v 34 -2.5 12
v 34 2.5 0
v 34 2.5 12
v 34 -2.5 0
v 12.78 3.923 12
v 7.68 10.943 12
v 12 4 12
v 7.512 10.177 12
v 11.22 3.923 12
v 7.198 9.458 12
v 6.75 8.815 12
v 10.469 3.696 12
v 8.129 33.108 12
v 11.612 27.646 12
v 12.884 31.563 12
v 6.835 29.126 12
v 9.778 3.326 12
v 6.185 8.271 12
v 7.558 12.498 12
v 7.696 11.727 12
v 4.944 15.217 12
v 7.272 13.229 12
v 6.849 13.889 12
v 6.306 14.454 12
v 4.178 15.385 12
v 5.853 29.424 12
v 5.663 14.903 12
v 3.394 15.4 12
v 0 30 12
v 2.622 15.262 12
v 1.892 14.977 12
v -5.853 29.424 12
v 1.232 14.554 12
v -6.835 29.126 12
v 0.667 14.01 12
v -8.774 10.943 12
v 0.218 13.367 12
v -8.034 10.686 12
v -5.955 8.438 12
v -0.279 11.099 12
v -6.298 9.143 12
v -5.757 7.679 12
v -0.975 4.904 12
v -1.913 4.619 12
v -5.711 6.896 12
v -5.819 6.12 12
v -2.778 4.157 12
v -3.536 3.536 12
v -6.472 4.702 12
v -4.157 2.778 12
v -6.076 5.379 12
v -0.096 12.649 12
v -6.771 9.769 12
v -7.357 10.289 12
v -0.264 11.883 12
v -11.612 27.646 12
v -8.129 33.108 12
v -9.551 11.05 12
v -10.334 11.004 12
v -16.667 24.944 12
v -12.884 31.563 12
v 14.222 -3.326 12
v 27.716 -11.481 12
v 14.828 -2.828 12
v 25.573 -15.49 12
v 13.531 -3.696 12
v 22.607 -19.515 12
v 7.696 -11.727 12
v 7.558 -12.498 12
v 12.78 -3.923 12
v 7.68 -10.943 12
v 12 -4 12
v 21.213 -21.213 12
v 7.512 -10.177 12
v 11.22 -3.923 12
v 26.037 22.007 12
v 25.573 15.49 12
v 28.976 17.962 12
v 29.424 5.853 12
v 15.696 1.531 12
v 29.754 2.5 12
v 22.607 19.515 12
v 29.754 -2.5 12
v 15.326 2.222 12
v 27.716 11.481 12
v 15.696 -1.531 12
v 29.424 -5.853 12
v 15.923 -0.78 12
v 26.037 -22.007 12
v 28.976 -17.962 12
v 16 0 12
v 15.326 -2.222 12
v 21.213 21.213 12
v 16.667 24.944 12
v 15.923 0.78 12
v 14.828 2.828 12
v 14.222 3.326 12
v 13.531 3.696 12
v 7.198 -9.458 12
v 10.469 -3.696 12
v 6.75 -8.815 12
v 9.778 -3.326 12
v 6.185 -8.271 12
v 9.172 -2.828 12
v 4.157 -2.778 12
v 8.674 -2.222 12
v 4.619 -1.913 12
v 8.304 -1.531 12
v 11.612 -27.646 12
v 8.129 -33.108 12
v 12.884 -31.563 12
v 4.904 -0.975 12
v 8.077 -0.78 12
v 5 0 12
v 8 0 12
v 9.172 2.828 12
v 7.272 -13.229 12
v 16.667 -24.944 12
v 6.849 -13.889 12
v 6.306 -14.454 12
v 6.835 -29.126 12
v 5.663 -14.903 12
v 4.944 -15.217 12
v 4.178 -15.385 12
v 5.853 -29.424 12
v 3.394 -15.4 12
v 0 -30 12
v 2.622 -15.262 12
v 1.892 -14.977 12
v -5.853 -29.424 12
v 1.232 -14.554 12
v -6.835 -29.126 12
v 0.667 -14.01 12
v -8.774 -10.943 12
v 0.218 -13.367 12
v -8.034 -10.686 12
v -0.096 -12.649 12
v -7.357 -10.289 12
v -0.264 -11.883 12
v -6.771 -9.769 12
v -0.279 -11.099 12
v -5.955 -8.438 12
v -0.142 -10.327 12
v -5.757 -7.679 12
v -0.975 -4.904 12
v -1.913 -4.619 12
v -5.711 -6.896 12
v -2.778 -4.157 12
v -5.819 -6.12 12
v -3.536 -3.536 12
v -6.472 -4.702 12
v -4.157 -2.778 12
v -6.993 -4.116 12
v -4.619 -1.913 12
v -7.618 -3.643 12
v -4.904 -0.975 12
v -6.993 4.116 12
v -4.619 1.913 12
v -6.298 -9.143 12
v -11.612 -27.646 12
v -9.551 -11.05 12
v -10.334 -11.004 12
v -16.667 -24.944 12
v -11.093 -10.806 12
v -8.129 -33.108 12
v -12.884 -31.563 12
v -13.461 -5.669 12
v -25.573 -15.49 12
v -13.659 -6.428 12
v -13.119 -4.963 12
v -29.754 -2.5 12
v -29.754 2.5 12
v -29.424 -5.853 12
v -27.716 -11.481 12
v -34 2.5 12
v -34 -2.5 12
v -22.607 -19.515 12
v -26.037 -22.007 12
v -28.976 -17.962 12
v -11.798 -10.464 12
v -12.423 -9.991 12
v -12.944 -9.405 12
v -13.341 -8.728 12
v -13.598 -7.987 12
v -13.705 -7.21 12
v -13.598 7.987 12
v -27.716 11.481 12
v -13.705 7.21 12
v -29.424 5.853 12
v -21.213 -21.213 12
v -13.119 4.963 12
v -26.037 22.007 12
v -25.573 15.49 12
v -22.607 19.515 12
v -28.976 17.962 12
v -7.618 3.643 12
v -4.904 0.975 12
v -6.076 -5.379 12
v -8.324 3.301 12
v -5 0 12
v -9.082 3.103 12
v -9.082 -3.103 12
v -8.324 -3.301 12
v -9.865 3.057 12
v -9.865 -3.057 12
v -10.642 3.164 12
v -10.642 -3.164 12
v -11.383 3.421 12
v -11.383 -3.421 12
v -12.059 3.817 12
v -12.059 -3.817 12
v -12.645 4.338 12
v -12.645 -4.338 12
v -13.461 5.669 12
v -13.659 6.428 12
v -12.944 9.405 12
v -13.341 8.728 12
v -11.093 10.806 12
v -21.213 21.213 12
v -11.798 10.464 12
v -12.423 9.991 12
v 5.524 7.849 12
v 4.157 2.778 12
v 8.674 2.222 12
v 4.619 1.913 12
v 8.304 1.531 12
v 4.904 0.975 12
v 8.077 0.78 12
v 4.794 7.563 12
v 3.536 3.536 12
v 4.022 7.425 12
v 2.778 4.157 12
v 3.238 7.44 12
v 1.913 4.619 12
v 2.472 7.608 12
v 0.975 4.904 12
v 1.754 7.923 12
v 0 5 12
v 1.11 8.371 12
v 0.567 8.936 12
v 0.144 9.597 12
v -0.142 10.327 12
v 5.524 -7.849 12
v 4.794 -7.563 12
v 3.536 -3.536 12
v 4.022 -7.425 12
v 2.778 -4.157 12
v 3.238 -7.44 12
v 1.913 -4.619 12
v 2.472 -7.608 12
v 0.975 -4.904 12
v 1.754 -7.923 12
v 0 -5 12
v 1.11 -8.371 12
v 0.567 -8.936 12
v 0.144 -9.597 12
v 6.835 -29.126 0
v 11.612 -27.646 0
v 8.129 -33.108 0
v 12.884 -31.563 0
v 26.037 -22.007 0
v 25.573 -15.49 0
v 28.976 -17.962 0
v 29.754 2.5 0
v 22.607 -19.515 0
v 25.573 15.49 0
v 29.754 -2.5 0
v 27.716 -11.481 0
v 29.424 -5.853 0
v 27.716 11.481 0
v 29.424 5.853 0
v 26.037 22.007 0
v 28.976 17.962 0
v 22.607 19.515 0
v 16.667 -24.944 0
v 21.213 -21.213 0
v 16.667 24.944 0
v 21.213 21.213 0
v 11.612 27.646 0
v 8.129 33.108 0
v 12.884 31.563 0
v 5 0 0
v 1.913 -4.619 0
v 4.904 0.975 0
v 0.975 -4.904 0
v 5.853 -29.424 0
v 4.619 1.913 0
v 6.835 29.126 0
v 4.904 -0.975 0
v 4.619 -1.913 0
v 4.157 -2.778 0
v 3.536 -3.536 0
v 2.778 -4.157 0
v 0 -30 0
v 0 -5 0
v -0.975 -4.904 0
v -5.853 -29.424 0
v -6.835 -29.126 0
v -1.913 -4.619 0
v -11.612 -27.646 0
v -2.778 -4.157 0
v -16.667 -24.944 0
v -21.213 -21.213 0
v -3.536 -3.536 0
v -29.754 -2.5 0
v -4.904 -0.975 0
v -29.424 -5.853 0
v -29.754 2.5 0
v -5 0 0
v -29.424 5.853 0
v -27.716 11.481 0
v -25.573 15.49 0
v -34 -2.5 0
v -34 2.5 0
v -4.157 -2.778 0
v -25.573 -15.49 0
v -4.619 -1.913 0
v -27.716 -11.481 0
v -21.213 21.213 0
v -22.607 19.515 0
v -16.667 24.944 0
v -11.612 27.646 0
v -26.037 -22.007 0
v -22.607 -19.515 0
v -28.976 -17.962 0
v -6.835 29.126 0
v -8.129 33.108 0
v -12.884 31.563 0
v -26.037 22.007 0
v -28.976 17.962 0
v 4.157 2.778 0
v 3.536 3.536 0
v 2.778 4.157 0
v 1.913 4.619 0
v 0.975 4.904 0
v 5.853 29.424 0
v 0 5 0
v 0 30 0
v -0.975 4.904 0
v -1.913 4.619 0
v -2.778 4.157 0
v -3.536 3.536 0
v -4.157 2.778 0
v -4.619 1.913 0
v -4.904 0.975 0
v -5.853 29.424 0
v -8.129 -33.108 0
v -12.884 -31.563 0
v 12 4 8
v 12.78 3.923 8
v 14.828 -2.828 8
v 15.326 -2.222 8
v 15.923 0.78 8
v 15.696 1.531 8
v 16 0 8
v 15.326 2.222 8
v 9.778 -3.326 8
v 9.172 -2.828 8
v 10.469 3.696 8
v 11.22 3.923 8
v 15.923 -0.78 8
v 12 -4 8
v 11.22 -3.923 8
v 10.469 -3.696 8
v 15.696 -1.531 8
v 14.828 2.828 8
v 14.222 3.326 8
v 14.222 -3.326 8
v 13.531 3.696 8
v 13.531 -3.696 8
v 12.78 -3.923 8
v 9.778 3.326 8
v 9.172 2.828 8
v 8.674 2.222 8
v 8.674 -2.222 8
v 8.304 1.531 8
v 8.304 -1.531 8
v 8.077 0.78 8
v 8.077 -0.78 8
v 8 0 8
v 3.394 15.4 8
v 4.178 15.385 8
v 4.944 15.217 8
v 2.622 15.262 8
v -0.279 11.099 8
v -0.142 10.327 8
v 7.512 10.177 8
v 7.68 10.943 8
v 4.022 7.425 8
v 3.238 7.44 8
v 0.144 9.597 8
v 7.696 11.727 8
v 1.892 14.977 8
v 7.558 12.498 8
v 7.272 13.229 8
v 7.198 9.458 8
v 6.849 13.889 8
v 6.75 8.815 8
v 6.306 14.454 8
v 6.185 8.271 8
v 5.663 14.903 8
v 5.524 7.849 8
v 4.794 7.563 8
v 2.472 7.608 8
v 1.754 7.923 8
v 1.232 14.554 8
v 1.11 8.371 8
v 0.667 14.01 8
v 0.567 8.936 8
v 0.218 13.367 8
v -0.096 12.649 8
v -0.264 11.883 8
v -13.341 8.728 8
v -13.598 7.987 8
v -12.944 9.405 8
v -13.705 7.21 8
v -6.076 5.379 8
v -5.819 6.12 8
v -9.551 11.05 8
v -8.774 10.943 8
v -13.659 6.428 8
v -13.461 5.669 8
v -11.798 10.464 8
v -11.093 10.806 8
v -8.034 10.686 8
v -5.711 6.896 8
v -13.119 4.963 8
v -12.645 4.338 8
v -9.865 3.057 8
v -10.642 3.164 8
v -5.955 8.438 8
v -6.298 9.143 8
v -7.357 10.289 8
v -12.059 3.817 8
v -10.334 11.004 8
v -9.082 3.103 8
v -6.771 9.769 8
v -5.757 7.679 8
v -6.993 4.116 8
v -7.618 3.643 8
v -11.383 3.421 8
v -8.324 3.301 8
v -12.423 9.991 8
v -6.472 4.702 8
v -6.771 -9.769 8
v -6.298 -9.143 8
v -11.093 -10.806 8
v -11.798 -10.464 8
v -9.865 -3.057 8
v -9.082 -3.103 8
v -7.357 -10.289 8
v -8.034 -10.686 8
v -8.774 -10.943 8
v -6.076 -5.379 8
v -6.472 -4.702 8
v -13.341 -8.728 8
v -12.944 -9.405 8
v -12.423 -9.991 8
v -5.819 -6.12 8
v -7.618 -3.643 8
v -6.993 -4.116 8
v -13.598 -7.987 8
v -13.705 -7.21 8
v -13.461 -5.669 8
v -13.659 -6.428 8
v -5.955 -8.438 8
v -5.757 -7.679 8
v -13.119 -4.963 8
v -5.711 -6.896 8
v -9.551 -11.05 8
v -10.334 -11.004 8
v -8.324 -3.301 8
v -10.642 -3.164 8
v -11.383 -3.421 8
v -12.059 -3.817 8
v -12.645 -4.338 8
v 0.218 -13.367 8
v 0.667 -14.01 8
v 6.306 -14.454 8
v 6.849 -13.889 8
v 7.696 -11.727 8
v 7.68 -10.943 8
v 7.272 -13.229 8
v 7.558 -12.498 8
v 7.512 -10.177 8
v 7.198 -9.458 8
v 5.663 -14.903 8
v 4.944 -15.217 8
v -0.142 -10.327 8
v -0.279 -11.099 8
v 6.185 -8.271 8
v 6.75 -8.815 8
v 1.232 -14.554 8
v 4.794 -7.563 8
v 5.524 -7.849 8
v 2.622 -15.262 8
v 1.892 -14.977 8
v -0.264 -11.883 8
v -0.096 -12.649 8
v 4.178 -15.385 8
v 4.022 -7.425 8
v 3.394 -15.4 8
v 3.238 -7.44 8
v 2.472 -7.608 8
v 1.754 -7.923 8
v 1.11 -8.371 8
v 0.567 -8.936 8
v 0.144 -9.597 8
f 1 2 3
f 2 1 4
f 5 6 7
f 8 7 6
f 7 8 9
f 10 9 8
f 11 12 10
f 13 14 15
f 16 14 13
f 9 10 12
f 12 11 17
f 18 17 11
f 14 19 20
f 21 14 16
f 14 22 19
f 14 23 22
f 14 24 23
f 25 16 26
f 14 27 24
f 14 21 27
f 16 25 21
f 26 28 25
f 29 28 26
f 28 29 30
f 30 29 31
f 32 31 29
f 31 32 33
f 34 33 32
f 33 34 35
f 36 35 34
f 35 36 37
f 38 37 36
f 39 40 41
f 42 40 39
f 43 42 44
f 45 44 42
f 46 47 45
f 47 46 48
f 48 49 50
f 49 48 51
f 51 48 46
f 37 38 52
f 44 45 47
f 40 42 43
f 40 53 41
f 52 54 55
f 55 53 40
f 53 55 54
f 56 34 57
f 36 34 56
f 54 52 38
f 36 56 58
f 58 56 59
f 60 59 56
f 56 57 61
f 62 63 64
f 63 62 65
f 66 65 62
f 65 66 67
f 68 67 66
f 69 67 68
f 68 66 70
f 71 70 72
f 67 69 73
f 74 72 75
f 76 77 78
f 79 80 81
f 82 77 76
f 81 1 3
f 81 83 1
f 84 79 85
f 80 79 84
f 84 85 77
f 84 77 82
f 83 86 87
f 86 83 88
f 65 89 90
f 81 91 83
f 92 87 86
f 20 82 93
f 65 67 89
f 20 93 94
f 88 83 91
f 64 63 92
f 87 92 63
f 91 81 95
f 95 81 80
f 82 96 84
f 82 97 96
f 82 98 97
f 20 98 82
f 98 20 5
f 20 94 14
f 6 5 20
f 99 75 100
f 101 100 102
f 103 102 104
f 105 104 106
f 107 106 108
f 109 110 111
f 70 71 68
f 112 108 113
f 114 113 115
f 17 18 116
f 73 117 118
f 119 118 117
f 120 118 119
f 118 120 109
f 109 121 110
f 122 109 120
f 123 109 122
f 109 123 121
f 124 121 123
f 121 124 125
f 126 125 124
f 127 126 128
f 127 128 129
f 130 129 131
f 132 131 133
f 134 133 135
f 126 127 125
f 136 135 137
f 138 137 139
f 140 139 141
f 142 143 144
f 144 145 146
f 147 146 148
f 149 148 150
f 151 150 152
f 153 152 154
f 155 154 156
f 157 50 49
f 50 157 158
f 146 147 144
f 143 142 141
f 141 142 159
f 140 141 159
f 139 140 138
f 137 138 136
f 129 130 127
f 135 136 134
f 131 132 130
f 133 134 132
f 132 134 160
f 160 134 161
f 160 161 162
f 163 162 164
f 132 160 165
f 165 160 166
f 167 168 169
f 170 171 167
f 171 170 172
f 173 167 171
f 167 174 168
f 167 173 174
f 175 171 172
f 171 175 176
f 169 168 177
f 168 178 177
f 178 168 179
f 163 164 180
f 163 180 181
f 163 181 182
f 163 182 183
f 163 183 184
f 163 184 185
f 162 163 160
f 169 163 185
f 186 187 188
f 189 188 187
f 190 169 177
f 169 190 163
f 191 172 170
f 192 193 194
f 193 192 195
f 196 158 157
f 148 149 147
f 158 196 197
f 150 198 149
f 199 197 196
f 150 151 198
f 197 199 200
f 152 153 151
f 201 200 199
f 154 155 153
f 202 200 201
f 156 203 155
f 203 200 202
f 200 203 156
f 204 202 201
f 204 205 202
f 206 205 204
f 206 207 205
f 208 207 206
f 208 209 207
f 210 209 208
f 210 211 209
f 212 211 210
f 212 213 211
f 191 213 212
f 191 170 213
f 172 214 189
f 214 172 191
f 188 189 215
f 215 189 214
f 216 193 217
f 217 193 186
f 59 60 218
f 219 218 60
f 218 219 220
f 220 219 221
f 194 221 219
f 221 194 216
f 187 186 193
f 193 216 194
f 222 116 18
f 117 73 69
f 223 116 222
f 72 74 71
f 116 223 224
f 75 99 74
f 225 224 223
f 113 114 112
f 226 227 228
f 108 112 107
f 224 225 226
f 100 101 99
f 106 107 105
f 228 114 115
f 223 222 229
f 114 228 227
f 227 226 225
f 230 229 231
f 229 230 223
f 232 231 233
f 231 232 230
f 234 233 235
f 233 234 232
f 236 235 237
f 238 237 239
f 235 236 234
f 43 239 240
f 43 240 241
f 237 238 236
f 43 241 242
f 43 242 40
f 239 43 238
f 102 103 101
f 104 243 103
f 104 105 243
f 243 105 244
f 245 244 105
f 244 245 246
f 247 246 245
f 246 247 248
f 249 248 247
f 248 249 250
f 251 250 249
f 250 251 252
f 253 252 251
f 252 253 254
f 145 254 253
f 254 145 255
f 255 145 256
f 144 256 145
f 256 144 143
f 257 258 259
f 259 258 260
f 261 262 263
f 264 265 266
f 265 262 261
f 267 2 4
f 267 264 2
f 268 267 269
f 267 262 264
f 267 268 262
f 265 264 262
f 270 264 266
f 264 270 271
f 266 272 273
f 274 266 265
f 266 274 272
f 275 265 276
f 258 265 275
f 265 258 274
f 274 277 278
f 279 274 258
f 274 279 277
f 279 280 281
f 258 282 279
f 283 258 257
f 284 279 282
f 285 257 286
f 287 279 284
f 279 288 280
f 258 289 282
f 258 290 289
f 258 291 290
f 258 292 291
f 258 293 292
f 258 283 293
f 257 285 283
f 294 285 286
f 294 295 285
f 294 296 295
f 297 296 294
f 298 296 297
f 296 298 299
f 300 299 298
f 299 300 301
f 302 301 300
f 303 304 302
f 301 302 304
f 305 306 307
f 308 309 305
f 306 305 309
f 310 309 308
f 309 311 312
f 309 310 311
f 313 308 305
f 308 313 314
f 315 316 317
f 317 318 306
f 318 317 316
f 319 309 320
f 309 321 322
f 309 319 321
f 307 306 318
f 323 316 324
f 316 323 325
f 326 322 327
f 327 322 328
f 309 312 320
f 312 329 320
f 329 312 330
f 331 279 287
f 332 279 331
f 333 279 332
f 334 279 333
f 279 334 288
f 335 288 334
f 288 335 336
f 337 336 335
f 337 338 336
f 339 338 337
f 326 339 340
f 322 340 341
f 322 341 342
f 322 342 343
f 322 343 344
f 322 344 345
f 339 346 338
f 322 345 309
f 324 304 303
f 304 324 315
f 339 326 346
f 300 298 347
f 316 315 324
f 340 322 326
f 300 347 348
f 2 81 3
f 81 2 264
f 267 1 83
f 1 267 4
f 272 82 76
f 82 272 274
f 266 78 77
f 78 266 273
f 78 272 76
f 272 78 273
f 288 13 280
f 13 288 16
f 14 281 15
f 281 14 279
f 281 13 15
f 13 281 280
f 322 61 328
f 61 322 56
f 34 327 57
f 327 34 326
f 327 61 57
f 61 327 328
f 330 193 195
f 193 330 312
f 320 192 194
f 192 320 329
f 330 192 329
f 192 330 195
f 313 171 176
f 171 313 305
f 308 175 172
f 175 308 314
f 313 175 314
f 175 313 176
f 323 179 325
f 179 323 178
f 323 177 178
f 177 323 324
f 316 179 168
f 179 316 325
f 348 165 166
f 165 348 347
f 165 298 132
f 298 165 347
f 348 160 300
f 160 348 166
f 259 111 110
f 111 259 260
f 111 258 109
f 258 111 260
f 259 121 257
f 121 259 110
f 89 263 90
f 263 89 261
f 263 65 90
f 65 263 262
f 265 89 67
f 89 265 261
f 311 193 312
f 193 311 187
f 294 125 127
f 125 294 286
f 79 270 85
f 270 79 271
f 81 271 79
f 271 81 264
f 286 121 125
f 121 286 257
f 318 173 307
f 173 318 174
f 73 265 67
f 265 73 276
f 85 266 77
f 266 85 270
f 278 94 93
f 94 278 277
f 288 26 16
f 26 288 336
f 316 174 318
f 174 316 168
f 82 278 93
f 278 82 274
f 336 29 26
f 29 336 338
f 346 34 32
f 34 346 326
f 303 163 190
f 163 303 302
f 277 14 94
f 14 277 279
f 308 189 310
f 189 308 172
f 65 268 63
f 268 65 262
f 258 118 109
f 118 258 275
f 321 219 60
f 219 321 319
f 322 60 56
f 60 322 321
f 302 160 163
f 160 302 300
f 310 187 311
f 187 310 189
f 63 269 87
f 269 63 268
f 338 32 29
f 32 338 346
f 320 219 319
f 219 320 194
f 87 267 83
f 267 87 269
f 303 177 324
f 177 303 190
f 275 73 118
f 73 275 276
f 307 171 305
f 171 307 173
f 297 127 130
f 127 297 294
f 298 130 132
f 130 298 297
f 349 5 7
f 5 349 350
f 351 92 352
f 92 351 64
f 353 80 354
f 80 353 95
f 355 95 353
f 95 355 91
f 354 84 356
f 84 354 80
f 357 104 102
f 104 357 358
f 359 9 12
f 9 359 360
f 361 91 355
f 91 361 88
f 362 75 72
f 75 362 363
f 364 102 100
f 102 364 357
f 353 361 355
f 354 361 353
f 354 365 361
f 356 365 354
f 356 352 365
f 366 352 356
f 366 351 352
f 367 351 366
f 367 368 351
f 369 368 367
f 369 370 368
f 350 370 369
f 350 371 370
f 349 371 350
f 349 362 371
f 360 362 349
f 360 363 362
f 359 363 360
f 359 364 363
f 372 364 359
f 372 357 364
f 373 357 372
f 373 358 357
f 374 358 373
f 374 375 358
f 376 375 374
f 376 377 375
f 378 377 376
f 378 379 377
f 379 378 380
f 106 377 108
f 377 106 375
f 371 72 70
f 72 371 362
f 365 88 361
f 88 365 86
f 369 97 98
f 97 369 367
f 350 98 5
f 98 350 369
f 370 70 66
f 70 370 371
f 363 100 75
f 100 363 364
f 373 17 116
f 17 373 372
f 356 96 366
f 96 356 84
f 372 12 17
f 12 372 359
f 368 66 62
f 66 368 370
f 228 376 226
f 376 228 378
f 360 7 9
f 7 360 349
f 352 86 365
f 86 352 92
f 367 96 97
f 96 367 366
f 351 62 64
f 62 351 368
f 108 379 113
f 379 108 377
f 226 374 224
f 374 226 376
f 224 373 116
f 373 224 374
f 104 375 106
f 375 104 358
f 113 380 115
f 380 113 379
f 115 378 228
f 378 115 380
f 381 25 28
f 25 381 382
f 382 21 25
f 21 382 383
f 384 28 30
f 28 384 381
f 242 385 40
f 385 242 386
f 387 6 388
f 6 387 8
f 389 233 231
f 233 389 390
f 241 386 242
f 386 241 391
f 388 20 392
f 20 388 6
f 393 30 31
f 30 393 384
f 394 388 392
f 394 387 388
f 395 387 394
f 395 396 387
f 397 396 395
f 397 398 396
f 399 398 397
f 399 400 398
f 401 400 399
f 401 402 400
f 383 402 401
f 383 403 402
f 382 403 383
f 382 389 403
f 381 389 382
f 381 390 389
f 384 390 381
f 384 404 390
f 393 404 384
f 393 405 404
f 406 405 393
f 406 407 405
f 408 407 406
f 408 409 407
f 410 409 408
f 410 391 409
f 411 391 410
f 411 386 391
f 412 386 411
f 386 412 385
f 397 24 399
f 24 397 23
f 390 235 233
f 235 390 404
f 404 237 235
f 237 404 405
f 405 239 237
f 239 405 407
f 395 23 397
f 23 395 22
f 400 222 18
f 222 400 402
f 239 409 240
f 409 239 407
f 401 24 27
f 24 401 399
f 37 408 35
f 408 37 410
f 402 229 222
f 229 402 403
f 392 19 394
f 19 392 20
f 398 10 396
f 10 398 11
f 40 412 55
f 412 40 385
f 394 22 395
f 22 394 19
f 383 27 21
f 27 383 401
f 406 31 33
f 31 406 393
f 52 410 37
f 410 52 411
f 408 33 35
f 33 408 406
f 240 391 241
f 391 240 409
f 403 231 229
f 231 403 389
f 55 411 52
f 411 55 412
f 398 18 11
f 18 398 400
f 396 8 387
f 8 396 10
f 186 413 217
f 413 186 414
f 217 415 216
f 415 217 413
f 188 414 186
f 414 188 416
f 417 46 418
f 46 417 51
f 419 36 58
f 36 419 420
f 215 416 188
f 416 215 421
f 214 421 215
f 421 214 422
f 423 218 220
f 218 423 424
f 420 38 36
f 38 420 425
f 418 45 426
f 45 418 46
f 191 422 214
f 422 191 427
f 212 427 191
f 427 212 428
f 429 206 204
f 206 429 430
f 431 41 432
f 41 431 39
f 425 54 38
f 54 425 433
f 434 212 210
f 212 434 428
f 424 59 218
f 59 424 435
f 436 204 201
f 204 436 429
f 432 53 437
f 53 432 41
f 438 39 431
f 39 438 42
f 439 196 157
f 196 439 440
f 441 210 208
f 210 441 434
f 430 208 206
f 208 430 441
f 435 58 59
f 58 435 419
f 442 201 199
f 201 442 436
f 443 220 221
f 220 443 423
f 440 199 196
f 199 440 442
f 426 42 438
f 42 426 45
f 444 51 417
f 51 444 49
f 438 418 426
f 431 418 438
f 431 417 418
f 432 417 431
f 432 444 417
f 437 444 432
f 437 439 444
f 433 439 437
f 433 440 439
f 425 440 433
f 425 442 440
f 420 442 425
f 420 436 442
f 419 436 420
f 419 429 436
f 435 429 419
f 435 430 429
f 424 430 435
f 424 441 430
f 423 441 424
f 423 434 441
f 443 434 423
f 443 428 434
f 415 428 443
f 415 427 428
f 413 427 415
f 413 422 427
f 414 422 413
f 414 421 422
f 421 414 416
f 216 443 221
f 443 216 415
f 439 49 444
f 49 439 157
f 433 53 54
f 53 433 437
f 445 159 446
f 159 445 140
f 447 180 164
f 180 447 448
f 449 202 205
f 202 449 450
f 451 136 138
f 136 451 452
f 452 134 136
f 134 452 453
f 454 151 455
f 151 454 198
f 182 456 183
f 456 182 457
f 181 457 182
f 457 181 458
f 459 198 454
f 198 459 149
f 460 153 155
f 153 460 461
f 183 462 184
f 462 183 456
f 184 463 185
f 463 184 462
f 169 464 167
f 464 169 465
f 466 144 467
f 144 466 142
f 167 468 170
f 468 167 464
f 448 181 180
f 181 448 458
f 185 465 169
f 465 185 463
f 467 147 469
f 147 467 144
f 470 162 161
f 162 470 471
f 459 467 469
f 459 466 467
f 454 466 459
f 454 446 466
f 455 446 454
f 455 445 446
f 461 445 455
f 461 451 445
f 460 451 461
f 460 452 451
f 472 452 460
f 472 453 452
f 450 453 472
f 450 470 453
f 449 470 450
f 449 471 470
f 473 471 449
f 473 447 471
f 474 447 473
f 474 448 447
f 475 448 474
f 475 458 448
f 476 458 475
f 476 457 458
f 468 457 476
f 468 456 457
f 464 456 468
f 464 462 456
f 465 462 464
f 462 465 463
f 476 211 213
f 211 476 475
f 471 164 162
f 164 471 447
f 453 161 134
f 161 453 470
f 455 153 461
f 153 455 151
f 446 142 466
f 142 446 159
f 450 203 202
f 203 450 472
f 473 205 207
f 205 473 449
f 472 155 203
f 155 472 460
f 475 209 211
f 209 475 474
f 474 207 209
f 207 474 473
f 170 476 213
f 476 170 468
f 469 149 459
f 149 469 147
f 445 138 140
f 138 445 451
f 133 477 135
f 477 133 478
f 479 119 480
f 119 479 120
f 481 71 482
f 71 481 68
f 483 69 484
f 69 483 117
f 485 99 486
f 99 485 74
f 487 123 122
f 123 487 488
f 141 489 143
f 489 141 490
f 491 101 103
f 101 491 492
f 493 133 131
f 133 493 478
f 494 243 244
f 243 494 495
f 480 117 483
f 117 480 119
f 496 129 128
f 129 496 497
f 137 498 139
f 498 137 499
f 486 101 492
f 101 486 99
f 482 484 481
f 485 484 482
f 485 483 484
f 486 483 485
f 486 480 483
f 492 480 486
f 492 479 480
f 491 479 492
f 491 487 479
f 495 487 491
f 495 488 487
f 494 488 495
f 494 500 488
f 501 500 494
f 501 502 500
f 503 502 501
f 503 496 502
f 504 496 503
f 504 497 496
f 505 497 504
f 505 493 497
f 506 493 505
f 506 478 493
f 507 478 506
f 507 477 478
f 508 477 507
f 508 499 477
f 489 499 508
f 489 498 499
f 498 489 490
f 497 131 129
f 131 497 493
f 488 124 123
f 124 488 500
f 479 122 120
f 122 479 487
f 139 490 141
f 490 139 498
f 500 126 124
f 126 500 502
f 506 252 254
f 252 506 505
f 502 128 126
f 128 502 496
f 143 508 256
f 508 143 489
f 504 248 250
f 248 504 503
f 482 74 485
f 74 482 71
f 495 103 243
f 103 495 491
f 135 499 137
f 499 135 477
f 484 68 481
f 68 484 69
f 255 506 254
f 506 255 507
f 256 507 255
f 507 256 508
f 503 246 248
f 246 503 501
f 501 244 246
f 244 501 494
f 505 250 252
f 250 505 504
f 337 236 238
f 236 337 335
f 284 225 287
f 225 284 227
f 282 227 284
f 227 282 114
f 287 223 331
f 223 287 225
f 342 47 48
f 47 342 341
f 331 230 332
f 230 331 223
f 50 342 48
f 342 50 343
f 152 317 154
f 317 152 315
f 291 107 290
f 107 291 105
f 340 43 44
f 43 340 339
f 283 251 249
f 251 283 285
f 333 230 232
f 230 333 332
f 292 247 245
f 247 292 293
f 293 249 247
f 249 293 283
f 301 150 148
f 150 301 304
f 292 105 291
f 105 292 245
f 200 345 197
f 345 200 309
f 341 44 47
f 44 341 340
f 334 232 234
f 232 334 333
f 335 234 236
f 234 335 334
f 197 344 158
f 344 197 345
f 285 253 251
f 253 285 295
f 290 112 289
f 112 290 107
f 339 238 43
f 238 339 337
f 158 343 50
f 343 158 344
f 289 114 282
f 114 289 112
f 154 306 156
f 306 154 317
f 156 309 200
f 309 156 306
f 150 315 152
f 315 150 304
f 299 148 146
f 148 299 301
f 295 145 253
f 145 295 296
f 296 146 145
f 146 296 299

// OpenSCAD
$fn = 32;

// ----------------------------------------------------------------------
// Spur blank: lightened gear blank
// ----------------------------------------------------------------------

// --- parameters (mm) ---
disc_r = 30;              // blank root radius
disc_t = 12;              // blank thickness
n_teeth = 10;             // stub tooth count
tooth_w = 5;              // tooth width at the root
tooth_h = 4;              // tooth height above the root
bore_r = 5;               // central bore radius
ring_r = 12;              // lightening pocket ring radius
pocket_r = 4;             // lightening pocket radius

out_r = disc_r + tooth_h;  // tip radius
bbox_x = 68.0;  // measured width over the teeth
bbox_y = 66.22;  // measured depth over the teeth

difference() {
union() {
  cylinder(r = disc_r, h = disc_t);
  for (i = [0 : n_teeth - 1])
    rotate([0, 0, i * 360 / n_teeth])
      translate([disc_r - 1, -tooth_w / 2, 0])
        cube([tooth_h + 1, tooth_w, disc_t]);
}
  translate([0, 0, -1]) cylinder(r = bore_r, h = disc_t + 2);
  for (i = [0 : 5])
    rotate([0, 0, i * 72])
      translate([ring_r, 0, disc_t - 4])
        cylinder(r = pocket_r, h = 5);
}
